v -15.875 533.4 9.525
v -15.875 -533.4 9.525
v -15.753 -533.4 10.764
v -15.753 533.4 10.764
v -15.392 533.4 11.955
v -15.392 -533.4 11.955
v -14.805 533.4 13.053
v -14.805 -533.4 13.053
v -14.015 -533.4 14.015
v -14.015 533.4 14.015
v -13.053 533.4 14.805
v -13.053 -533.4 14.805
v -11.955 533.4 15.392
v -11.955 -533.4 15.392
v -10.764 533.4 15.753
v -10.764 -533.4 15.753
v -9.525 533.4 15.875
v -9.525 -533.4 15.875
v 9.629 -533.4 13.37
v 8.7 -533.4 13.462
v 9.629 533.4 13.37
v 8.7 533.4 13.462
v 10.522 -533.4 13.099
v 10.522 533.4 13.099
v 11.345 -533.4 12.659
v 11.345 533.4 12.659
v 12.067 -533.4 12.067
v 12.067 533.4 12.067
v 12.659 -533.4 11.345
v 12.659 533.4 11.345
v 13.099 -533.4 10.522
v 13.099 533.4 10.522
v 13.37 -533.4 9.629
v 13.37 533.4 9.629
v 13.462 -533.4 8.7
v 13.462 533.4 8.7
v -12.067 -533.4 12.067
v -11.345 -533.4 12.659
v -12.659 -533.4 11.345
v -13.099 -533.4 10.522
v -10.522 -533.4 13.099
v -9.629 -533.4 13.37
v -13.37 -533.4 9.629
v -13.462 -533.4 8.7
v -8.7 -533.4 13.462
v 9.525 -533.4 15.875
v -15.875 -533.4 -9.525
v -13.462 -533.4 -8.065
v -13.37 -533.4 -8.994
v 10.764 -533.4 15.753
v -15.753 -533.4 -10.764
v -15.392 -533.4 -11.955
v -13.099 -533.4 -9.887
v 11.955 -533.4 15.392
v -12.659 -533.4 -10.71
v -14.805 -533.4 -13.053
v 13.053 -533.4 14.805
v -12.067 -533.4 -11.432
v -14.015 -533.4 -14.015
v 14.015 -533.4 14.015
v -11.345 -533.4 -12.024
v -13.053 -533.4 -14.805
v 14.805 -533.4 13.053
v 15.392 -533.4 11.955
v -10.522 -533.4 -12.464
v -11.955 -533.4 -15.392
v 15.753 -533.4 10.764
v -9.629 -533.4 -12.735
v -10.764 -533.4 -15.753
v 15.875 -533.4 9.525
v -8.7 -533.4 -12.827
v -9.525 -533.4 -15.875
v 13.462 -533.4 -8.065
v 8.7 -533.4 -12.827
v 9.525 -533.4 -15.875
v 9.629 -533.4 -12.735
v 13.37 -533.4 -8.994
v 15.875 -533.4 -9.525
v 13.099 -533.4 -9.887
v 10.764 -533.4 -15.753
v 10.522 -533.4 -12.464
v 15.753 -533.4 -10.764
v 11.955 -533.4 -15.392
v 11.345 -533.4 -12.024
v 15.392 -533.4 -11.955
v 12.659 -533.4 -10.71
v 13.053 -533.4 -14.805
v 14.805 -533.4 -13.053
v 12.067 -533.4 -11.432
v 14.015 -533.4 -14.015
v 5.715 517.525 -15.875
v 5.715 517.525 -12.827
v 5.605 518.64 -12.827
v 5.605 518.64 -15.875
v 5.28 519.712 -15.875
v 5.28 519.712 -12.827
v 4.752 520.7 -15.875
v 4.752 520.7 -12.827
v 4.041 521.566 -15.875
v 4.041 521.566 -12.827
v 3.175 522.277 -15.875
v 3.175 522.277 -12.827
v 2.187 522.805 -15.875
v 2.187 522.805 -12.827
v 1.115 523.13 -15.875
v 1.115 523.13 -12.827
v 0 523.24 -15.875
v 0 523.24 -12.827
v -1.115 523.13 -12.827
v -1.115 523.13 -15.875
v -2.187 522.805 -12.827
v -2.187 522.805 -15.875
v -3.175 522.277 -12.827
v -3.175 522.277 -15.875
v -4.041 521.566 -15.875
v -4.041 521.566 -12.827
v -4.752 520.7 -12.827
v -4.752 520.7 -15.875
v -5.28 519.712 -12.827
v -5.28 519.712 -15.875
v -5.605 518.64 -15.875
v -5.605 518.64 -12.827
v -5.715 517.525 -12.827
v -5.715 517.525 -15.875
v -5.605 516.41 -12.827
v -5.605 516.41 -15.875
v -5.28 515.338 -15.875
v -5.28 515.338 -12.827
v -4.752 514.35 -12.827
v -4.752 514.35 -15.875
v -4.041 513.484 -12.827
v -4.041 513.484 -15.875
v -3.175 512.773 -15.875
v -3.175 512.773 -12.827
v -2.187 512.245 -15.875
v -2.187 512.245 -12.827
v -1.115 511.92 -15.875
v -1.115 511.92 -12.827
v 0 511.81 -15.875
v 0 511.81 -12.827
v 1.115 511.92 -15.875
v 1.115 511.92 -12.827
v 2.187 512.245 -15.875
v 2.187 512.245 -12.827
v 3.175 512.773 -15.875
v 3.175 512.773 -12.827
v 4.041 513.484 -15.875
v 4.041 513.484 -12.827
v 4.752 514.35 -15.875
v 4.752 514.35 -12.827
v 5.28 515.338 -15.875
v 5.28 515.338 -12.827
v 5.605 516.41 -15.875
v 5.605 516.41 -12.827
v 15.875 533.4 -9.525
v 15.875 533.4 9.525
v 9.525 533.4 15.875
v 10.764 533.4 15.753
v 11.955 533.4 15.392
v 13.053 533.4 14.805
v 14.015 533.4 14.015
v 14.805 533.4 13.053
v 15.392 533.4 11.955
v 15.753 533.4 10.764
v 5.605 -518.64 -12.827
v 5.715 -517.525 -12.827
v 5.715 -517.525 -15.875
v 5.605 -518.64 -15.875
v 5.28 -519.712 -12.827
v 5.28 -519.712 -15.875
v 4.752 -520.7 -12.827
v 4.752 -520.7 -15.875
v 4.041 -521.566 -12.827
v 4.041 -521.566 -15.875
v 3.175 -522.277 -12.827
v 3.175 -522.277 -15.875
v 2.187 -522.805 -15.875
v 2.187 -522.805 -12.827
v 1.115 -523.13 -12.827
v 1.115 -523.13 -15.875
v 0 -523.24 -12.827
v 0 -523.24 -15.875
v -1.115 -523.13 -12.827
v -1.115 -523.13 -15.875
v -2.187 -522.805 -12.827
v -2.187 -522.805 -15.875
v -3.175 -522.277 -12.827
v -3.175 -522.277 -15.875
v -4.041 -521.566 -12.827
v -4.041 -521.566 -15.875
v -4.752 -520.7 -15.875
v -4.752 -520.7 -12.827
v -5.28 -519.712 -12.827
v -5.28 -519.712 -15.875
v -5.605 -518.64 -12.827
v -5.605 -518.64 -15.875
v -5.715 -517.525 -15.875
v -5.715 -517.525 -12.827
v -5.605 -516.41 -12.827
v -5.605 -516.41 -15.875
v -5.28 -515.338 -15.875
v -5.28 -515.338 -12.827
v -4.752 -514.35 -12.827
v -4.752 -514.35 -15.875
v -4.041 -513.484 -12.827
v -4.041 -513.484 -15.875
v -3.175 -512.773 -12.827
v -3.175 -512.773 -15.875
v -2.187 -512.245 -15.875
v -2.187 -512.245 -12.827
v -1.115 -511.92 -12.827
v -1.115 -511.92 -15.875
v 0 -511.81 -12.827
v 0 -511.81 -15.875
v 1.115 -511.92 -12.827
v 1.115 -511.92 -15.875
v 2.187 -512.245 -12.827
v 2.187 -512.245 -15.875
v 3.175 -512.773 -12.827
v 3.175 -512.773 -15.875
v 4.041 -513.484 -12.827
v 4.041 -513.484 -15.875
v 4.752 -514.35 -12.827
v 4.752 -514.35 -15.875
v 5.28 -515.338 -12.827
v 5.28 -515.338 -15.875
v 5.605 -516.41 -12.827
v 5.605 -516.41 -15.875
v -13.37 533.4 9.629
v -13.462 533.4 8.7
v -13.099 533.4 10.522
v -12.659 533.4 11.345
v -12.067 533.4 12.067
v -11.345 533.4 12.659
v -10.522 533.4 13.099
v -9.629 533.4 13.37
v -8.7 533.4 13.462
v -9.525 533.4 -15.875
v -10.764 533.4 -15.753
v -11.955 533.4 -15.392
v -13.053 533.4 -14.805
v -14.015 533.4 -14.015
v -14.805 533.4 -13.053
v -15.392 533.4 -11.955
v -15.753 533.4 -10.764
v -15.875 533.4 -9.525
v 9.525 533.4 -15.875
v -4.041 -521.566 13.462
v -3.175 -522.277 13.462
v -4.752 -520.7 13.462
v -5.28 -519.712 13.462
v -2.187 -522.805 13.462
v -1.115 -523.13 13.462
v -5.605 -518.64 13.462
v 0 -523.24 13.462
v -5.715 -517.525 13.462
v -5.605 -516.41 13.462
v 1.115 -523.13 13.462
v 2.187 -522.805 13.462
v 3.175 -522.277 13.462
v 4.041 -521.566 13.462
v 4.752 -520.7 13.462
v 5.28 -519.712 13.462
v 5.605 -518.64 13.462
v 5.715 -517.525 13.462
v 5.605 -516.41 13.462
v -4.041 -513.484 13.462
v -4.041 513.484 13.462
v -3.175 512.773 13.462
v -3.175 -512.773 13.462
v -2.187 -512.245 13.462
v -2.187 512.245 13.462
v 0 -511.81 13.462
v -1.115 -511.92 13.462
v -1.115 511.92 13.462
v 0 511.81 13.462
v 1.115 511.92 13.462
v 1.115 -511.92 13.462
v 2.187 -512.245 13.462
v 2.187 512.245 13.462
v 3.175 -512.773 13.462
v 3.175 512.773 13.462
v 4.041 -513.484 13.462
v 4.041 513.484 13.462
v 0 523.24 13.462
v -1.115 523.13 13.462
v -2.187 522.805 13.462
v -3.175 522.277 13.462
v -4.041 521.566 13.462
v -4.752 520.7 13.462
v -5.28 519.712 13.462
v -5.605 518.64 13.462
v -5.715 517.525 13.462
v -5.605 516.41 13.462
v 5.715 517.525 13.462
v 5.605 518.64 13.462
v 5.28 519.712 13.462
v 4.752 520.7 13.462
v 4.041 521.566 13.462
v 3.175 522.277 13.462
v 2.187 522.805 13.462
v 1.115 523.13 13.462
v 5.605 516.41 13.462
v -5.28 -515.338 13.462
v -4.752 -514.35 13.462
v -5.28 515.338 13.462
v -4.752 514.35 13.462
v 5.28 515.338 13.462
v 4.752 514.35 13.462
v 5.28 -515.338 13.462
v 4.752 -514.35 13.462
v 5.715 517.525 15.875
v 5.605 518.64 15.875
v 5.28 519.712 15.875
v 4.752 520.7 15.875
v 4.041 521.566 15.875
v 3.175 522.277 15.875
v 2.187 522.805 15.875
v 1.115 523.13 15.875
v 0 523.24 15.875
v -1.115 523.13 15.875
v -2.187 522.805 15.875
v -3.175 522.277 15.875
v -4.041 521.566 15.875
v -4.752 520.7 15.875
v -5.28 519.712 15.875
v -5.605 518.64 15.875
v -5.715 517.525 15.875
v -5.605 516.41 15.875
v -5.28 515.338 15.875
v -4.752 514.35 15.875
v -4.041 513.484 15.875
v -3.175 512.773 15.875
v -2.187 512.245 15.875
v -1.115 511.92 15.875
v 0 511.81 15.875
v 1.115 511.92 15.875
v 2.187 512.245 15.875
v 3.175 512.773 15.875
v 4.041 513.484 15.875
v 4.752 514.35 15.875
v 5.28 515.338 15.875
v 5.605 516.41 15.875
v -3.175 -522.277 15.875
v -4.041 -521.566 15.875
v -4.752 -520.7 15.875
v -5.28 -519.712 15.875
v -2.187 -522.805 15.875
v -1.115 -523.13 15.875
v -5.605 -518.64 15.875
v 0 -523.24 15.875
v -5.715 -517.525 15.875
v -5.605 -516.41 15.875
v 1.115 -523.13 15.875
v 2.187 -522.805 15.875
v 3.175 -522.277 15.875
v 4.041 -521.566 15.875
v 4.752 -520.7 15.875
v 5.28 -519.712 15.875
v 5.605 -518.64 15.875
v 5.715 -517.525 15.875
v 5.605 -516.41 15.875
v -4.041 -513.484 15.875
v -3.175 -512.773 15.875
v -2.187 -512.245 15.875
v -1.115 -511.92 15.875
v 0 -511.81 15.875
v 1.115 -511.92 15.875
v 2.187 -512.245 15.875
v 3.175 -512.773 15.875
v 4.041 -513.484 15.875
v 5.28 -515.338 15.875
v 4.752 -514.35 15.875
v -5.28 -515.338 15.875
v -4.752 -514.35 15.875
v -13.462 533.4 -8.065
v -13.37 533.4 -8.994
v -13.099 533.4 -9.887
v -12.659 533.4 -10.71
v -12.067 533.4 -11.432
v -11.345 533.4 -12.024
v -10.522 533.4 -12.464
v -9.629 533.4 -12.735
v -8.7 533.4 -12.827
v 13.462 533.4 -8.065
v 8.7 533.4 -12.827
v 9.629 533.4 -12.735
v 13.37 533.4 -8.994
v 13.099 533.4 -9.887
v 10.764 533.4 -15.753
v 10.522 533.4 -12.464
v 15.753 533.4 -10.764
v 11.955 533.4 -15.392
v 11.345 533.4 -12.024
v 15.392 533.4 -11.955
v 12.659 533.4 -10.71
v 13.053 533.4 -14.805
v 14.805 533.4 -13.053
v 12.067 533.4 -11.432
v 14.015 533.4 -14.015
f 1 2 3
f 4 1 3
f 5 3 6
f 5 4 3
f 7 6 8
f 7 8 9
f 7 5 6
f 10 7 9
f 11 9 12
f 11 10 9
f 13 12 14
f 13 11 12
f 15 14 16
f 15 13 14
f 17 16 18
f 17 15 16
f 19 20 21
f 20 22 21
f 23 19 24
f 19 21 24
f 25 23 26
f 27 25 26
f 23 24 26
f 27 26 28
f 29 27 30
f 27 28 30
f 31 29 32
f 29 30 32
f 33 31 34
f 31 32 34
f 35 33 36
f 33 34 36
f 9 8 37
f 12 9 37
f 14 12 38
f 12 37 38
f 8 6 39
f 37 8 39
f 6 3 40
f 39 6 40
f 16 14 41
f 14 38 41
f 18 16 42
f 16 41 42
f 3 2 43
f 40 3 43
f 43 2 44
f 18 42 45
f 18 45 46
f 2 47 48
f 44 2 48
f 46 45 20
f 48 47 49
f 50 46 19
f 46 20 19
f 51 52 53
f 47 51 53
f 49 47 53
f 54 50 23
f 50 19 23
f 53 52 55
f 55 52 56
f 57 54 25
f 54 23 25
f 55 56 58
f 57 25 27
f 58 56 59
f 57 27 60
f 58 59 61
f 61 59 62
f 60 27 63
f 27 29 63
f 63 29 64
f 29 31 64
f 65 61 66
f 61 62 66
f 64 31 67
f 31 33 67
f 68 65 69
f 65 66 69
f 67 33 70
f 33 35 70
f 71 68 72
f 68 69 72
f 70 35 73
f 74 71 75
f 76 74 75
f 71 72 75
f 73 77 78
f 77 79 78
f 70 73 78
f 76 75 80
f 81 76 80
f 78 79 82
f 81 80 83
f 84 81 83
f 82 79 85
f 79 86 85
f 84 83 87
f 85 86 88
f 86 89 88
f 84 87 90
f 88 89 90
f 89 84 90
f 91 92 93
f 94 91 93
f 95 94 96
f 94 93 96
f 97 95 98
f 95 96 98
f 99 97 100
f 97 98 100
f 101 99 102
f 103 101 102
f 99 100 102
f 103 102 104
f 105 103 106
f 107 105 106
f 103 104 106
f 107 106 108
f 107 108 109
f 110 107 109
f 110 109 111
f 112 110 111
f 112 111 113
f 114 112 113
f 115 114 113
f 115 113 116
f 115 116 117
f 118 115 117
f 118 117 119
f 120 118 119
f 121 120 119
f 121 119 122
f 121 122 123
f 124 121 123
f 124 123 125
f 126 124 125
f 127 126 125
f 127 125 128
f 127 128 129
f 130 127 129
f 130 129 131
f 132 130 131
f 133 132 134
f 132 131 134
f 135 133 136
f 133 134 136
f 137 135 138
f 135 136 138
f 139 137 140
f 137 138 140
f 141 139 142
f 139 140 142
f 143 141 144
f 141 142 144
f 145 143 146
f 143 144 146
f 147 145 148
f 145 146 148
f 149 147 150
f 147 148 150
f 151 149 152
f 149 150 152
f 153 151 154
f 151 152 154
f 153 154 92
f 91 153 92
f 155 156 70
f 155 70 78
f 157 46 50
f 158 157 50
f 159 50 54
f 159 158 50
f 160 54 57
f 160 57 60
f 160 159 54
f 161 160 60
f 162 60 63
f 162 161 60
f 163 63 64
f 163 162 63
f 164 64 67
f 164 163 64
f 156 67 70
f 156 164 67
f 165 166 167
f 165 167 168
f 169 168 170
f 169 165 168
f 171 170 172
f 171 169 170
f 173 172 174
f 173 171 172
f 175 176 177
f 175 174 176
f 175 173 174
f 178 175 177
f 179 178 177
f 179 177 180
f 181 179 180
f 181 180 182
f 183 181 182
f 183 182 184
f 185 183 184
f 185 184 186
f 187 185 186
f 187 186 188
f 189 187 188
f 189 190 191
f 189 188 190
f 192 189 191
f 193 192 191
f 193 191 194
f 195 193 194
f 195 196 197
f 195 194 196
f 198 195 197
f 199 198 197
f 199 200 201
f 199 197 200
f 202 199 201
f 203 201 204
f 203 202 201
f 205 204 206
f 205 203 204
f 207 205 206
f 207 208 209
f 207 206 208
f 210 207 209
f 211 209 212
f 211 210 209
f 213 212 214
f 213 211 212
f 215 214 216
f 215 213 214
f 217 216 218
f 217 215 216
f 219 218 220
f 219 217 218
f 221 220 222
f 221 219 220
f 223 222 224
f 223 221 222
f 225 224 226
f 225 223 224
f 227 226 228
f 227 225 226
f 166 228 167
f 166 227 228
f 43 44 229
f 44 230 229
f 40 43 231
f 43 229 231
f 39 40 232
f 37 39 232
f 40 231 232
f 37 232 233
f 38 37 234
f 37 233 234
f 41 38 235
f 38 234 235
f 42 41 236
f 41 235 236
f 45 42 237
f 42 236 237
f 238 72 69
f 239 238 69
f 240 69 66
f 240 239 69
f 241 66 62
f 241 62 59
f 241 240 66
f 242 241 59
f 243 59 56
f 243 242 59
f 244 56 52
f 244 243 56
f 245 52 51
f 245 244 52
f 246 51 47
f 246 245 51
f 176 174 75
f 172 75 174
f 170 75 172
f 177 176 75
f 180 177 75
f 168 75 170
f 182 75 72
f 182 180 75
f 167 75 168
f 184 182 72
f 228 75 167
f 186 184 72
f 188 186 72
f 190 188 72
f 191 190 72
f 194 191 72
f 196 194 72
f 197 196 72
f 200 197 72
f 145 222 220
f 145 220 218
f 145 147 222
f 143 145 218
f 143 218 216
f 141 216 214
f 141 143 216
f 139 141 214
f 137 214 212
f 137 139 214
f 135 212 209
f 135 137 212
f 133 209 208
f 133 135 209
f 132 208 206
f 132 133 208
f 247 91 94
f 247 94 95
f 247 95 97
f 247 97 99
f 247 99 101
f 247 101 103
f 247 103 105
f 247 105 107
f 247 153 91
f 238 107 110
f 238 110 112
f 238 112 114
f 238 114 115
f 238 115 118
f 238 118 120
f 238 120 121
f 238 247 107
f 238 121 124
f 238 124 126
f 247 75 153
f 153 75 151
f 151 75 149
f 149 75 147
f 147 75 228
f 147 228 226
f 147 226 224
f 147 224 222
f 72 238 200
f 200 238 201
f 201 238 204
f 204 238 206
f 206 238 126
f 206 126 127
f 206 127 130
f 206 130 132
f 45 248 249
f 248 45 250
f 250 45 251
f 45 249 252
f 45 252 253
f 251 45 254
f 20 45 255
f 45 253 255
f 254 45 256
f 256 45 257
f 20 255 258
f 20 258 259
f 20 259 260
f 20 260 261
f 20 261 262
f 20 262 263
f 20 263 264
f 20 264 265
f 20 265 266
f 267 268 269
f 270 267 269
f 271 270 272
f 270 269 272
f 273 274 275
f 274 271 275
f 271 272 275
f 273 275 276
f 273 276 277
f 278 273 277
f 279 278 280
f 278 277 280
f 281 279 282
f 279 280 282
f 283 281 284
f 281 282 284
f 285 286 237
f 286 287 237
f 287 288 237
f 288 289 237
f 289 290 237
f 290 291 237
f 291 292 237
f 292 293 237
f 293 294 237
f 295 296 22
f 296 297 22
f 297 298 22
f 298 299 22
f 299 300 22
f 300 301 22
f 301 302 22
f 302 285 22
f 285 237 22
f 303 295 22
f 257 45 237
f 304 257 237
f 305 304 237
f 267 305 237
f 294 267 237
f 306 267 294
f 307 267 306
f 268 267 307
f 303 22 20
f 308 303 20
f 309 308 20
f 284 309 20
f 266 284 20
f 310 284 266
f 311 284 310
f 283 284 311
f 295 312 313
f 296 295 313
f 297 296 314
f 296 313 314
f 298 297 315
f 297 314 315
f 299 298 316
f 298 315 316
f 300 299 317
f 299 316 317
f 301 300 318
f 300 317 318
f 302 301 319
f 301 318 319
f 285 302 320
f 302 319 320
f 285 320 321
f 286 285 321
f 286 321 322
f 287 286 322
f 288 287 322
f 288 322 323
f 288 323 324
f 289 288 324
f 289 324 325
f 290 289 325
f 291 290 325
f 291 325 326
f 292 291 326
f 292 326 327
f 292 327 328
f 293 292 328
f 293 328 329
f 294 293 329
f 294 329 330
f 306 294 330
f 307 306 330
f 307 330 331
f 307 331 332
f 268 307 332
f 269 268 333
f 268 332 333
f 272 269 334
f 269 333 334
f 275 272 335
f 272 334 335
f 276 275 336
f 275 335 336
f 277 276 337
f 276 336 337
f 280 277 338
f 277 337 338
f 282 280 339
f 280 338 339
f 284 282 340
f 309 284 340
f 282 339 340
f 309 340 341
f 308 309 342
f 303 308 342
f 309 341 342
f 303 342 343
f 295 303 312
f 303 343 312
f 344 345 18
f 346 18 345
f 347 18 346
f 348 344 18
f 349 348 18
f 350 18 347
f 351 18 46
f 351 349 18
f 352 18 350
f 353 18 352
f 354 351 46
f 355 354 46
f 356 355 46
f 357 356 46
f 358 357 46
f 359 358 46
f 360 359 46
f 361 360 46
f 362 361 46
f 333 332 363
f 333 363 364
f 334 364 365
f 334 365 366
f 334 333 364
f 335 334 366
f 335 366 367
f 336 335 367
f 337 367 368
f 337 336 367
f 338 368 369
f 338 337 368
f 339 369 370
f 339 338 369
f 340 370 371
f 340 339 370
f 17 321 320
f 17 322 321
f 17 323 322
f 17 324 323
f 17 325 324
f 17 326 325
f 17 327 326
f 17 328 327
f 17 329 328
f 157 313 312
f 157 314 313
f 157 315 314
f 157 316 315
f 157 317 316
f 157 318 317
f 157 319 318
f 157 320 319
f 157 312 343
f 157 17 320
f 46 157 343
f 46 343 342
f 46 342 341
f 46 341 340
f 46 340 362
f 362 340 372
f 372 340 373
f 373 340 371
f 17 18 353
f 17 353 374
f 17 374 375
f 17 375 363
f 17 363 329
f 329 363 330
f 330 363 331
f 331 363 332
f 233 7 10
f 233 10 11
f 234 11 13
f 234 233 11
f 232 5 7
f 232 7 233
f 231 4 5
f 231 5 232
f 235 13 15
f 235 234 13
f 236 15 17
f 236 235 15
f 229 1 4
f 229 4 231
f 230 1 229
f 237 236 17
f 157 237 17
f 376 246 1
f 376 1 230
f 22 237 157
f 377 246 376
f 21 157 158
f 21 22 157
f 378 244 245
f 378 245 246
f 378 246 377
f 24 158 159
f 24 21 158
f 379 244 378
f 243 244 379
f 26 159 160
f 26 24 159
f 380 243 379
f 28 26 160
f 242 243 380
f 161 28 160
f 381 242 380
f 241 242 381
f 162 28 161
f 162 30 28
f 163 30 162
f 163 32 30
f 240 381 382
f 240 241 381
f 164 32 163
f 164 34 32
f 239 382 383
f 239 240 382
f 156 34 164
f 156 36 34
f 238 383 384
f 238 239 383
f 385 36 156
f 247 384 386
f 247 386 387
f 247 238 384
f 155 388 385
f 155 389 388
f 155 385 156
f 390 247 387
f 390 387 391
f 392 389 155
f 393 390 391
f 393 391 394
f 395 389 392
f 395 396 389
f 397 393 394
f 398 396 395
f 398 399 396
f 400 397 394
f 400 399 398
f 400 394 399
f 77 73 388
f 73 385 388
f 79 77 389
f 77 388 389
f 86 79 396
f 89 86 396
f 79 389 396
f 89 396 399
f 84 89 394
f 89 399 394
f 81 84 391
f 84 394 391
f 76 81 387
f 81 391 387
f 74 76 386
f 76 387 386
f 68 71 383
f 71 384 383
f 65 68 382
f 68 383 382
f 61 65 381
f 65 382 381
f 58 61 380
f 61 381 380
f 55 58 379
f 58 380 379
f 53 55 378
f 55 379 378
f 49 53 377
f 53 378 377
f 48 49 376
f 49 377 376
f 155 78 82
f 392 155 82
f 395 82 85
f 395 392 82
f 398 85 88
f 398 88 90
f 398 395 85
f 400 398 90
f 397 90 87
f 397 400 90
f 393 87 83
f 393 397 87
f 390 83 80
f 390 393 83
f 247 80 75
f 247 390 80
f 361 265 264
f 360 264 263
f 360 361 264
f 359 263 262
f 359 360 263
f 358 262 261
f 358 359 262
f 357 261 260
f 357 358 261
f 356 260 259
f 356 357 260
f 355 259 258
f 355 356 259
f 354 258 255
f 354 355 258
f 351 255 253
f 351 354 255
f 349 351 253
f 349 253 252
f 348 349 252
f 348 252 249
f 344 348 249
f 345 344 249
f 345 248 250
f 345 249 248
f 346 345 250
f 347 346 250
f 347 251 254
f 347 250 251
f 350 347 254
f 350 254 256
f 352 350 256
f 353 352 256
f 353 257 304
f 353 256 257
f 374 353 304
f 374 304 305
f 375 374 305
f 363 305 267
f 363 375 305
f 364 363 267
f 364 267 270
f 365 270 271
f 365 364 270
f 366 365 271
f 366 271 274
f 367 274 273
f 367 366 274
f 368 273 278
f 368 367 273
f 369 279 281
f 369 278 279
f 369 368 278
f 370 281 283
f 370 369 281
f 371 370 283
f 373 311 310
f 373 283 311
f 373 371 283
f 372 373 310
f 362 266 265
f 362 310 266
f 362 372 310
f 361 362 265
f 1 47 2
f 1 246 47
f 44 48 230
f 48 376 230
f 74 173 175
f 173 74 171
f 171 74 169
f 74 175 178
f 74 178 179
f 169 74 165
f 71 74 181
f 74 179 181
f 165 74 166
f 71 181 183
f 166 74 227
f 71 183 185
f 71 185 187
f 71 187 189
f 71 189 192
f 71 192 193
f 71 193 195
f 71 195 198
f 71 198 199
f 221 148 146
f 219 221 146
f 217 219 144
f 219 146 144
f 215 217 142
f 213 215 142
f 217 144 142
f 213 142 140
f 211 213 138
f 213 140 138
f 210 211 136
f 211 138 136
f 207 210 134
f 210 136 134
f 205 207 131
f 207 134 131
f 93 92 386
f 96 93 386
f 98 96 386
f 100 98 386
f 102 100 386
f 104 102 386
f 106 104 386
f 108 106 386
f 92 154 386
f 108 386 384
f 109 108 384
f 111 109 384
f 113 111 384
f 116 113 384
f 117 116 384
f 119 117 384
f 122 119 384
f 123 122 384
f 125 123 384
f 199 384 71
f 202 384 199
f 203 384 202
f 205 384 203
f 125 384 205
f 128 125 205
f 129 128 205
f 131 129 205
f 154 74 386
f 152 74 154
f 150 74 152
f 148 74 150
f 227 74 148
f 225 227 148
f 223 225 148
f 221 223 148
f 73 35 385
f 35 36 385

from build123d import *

# Parameters (mm, degrees)
BOSS_EXTRUDE1_DEPTH = 533.4
SKETCH2_R           = 5.715
CUT_EXTRUDE1_DEPTH  = 32.75


with BuildPart() as part:
    # Sketch1 → Boss-Extrude1 (new body, symmetric)
    with BuildSketch(Plane(origin=(0, 0, 0), x_dir=(1, 0, 0), z_dir=(0, 1, 0))):
        with BuildLine():
            Line((-9.525, -15.875), (9.525, -15.875))
            ThreePointArc((9.525, -15.875), (14.015128061, -14.015128061), (15.875, -9.525))
            Line((15.875, -9.525), (15.875, 9.525))
            ThreePointArc((15.875, 9.525), (14.015128061, 14.015128061), (9.525, 15.875))
            Line((9.525, 15.875), (-9.525, 15.875))
            ThreePointArc((-9.525, 15.875), (-14.015128061, 14.015128061), (-15.875, 9.525))
            Line((-15.875, 9.525), (-15.875, -9.525))
            ThreePointArc((-15.875, -9.525), (-14.015128061, -14.015128061), (-9.525, -15.875))
        make_face()
        with BuildLine():
            Line((-8.6995, -13.462), (8.6995, -13.462))
            ThreePointArc((8.6995, -13.462), (12.067096045, -12.067096045), (13.462, -8.6995))
            Line((13.462, -8.6995), (13.462, 8.0645))
            ThreePointArc((13.462, 8.0645), (12.067096045, 11.432096045), (8.6995, 12.827))
            Line((8.6995, 12.827), (-8.6995, 12.827))
            ThreePointArc((-8.6995, 12.827), (-12.067096045, 11.432096045), (-13.462, 8.0645))
            Line((-13.462, 8.0645), (-13.462, -8.6995))
            ThreePointArc((-13.462, -8.6995), (-12.067096045, -12.067096045), (-8.6995, -13.462))
        make_face(mode=Mode.SUBTRACT)
    extrude(amount=BOSS_EXTRUDE1_DEPTH, both=True)

    # Sketch2 → Cut-Extrude1 (cut, through all)
    with BuildSketch(Plane.XY.offset(15.875)):
        with Locations((0, 517.525)):
            Circle(SKETCH2_R)
    cut_extrude1 = extrude(amount=-CUT_EXTRUDE1_DEPTH, mode=Mode.SUBTRACT)

    # Mirror1: Cut-Extrude1 across plane
    add(cut_extrude1.mirror(Plane.ZX), mode=Mode.SUBTRACT)


solid = part.part
